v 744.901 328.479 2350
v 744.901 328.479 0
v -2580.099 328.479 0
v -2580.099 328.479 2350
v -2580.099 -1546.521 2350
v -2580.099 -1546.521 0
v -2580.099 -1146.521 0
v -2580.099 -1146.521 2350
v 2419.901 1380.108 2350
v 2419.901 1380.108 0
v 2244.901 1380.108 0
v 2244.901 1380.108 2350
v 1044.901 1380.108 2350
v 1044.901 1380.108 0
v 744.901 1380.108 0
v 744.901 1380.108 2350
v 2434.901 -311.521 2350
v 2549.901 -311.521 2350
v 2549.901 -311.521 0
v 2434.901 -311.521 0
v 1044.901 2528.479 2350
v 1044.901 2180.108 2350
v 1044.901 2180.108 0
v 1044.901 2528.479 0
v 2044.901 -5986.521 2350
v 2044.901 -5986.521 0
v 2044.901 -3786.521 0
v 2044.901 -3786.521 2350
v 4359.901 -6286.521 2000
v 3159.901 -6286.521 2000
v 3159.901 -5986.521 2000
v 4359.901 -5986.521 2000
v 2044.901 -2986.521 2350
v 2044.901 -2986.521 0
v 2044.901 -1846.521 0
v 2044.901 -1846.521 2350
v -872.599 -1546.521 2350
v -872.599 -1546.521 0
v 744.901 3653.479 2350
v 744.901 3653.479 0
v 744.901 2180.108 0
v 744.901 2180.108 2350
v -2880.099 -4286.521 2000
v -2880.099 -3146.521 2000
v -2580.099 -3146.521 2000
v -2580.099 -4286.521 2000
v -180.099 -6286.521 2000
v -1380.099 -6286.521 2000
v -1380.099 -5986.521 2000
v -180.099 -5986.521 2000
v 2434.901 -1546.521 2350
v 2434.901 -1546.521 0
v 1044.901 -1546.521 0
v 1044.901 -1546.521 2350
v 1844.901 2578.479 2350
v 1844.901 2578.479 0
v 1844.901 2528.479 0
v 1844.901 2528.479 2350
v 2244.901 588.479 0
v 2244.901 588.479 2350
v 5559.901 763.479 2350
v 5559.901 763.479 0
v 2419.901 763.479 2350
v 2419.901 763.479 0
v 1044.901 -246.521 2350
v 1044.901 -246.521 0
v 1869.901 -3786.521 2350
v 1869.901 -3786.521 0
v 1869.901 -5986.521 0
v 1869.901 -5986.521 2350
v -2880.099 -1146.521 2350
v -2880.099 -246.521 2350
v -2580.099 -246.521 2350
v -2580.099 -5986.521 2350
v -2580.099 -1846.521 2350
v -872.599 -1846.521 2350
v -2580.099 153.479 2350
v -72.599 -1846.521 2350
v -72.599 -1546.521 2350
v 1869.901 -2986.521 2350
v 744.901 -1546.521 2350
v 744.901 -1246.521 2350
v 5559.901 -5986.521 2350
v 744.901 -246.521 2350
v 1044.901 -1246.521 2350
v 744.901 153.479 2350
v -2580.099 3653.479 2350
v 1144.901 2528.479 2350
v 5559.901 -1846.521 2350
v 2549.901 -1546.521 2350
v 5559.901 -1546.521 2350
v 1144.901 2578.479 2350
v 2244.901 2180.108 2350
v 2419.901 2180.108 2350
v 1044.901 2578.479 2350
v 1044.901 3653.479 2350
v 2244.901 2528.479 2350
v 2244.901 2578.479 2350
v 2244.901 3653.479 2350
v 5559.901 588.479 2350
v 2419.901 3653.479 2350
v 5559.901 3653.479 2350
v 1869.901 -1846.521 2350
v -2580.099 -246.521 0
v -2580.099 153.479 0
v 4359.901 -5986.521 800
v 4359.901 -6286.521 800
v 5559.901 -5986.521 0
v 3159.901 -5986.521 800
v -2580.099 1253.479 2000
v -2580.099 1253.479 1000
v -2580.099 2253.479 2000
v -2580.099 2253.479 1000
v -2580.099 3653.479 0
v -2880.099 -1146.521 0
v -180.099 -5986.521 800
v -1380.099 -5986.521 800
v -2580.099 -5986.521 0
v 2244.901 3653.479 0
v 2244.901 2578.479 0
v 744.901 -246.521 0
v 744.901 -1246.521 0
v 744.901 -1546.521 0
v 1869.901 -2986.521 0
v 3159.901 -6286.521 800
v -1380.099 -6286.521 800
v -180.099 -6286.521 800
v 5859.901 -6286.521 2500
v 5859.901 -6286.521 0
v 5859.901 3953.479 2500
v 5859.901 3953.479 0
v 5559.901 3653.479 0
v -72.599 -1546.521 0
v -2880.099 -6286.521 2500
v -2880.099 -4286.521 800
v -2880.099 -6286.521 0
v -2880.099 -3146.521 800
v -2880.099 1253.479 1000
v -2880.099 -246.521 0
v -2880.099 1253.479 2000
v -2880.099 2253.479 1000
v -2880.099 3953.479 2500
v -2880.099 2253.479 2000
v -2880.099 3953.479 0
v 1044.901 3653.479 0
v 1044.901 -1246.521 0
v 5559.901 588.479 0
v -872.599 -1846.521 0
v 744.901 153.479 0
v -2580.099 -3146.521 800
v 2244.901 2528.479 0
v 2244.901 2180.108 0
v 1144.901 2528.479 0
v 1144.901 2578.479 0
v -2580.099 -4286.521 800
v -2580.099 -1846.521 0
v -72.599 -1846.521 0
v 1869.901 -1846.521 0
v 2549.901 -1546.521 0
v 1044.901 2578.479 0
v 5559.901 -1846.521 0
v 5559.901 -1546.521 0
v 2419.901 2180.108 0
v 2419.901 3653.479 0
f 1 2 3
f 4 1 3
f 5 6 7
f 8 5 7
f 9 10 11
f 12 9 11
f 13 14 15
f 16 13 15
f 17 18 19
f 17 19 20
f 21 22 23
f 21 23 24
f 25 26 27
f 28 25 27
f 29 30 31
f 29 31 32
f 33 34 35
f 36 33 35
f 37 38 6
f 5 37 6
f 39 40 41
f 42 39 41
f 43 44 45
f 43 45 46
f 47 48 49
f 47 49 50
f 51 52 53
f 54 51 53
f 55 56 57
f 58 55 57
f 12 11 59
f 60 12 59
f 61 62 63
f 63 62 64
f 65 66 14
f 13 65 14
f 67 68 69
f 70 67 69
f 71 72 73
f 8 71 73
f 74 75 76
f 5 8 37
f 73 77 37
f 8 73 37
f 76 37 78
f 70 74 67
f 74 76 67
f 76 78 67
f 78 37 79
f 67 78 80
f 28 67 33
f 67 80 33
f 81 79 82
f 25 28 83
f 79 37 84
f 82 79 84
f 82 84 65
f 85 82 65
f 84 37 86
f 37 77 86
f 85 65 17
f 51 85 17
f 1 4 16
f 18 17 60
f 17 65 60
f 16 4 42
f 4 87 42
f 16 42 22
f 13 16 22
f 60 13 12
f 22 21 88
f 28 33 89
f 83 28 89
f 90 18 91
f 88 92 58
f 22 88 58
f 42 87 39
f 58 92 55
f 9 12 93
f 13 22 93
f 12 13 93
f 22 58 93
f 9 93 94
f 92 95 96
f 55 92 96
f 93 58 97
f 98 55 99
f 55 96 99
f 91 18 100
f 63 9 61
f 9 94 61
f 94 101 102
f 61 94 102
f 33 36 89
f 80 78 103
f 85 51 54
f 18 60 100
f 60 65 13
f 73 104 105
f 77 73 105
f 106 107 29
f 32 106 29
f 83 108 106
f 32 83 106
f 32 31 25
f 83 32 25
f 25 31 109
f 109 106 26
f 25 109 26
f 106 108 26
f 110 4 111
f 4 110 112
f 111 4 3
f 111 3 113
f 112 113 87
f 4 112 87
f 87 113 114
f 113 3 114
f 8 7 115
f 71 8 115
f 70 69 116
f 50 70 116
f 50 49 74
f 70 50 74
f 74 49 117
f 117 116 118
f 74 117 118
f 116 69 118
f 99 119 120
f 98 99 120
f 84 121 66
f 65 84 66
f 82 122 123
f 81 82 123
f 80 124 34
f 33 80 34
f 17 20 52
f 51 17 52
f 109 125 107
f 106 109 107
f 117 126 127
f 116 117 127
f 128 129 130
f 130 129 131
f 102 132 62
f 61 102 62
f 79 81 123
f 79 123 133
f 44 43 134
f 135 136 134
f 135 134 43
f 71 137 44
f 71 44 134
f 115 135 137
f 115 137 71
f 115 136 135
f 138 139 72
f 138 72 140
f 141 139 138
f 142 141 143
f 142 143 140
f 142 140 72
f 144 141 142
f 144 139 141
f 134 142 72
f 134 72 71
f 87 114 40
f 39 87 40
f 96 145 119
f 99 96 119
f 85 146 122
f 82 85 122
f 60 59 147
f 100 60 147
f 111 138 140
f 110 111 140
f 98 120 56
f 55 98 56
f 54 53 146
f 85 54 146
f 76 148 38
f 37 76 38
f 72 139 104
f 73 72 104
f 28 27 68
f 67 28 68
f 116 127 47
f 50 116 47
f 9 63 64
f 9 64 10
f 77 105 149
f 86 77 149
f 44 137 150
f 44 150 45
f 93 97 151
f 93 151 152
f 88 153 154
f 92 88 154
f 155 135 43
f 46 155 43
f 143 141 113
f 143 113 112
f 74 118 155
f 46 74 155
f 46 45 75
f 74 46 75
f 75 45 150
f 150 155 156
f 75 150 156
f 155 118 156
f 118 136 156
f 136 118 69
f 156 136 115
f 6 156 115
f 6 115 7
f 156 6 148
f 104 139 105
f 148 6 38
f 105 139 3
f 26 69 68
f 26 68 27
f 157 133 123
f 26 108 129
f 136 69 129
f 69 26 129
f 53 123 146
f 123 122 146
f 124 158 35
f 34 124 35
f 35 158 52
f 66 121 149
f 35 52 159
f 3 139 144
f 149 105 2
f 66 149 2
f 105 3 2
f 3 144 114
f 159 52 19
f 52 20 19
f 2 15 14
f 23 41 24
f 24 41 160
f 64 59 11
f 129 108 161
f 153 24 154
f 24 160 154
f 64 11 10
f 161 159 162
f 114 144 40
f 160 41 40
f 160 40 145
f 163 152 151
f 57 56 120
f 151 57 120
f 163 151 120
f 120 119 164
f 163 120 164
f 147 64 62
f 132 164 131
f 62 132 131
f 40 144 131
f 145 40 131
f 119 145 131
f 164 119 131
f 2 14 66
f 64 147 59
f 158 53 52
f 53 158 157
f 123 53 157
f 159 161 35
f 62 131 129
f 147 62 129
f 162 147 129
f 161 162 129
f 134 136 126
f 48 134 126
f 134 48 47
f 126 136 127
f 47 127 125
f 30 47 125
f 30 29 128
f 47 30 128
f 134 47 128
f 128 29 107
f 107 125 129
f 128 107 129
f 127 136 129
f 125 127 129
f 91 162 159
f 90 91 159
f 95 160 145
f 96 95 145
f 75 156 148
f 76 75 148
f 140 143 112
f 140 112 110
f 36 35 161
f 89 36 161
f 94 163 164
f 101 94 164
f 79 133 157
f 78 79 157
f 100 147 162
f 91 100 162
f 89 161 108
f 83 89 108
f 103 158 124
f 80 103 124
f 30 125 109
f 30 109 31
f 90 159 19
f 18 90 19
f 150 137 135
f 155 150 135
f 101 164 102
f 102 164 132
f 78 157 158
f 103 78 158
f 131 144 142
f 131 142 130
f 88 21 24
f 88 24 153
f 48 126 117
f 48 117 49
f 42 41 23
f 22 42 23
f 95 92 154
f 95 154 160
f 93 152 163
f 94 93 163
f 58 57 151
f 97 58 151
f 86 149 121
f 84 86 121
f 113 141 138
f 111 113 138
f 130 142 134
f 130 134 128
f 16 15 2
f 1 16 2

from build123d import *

# Parameters (mm, degrees)
F1_DEPTH = 2350
F2_W     = 8740
F2_H     = 10240
F3_DEPTH = 150
F4_W     = 1000
F4_H     = 1000
F4_W_2   = 1140
F4_H_2   = 1200
F5_DEPTH = 300
F6_W     = 1200
F6_H     = 1200
F7_DEPTH = 300


with BuildPart() as f1:
    # F0 (on Top) → F1 (new body)
    with BuildSketch(Plane.XY):
        Polygon((5859.900937, 3953.479228), (-2880.099063, 3953.479228), (-2880.099063, -246.520772), (-2580.099063, -246.520772), (-2580.099063, 153.479228), (744.900937, 153.479228), (744.900937, -246.520772), (1044.900937, -246.520772), (1044.900937, 1380.107756), (744.900937, 1380.107756), (744.900937, 328.479228), (-2580.099063, 328.479228), (-2580.099063, 3653.479228), (744.900937, 3653.479228), (744.900937, 2180.107756), (1044.900937, 2180.107756), (1044.900937, 2528.479228), (1144.900937, 2528.479228), (1144.900937, 2578.479228), (1044.900937, 2578.479228), (1044.900937, 3653.479228), (2244.900937, 3653.479228), (2244.900937, 2578.479228), (1844.900937, 2578.479228), (1844.900937, 2528.479228), (2244.900937, 2528.479228), (2244.900937, 2180.107756), (2419.900937, 2180.107756), (2419.900937, 3653.479228), (5559.900937, 3653.479228), (5559.900937, 763.479228), (2419.900937, 763.479228), (2419.900937, 1380.107756), (2244.900937, 1380.107756), (2244.900937, 588.479228), (5559.900937, 588.479228), (5559.900937, -1546.520772), (2549.900937, -1546.520772), (2549.900937, -311.520772), (2434.900937, -311.520772), (2434.900937, -1546.520772), (1044.900937, -1546.520772), (1044.900937, -1246.520772), (744.900937, -1246.520772), (744.900937, -1546.520772), (-72.599063, -1546.520772), (-72.599063, -1846.520772), (1869.900937, -1846.520772), (1869.900937, -2986.520772), (2044.900937, -2986.520772), (2044.900937, -1846.520772), (5559.900937, -1846.520772), (5559.900937, -5986.520772), (2044.900937, -5986.520772), (2044.900937, -3786.520772), (1869.900937, -3786.520772), (1869.900937, -5986.520772), (-2580.099063, -5986.520772), (-2580.099063, -1846.520772), (-872.599063, -1846.520772), (-872.599063, -1546.520772), (-2580.099063, -1546.520772), (-2580.099063, -1146.520772), (-2880.099063, -1146.520772), (-2880.099063, -6286.520772), (5859.900937, -6286.520772), align=None)
    extrude(amount=F1_DEPTH)

    # F2 (on face) → F3 (join)
    with BuildSketch(Plane.XY.offset(2350)):
        with Locations((1489.900937, -1166.520772)):
            Rectangle(F2_W, F2_H)
    extrude(amount=F3_DEPTH)

    # F4 (on face) → F5 (cut)
    with BuildSketch(Plane(origin=(-2880.099063, 0, 0), x_dir=(0, -1, 0), z_dir=(-1, 0, 0))):
        with Locations((-1753.479228, 1500)):
            Rectangle(F4_W, F4_H)
        with Locations((3716.520772, 1400)):
            Rectangle(F4_W_2, F4_H_2)
    extrude(amount=-F5_DEPTH, mode=Mode.SUBTRACT)

    # F6 (on face) → F7 (cut)
    with BuildSketch(Plane.XZ.offset(6286.520772)):
        with Locations((-780.099063, 1400)):
            Rectangle(F6_W, F6_H)
        with Locations((3759.900937, 1400)):
            Rectangle(F6_W, F6_H)
    extrude(amount=-F7_DEPTH, mode=Mode.SUBTRACT)


solid = f1.part
